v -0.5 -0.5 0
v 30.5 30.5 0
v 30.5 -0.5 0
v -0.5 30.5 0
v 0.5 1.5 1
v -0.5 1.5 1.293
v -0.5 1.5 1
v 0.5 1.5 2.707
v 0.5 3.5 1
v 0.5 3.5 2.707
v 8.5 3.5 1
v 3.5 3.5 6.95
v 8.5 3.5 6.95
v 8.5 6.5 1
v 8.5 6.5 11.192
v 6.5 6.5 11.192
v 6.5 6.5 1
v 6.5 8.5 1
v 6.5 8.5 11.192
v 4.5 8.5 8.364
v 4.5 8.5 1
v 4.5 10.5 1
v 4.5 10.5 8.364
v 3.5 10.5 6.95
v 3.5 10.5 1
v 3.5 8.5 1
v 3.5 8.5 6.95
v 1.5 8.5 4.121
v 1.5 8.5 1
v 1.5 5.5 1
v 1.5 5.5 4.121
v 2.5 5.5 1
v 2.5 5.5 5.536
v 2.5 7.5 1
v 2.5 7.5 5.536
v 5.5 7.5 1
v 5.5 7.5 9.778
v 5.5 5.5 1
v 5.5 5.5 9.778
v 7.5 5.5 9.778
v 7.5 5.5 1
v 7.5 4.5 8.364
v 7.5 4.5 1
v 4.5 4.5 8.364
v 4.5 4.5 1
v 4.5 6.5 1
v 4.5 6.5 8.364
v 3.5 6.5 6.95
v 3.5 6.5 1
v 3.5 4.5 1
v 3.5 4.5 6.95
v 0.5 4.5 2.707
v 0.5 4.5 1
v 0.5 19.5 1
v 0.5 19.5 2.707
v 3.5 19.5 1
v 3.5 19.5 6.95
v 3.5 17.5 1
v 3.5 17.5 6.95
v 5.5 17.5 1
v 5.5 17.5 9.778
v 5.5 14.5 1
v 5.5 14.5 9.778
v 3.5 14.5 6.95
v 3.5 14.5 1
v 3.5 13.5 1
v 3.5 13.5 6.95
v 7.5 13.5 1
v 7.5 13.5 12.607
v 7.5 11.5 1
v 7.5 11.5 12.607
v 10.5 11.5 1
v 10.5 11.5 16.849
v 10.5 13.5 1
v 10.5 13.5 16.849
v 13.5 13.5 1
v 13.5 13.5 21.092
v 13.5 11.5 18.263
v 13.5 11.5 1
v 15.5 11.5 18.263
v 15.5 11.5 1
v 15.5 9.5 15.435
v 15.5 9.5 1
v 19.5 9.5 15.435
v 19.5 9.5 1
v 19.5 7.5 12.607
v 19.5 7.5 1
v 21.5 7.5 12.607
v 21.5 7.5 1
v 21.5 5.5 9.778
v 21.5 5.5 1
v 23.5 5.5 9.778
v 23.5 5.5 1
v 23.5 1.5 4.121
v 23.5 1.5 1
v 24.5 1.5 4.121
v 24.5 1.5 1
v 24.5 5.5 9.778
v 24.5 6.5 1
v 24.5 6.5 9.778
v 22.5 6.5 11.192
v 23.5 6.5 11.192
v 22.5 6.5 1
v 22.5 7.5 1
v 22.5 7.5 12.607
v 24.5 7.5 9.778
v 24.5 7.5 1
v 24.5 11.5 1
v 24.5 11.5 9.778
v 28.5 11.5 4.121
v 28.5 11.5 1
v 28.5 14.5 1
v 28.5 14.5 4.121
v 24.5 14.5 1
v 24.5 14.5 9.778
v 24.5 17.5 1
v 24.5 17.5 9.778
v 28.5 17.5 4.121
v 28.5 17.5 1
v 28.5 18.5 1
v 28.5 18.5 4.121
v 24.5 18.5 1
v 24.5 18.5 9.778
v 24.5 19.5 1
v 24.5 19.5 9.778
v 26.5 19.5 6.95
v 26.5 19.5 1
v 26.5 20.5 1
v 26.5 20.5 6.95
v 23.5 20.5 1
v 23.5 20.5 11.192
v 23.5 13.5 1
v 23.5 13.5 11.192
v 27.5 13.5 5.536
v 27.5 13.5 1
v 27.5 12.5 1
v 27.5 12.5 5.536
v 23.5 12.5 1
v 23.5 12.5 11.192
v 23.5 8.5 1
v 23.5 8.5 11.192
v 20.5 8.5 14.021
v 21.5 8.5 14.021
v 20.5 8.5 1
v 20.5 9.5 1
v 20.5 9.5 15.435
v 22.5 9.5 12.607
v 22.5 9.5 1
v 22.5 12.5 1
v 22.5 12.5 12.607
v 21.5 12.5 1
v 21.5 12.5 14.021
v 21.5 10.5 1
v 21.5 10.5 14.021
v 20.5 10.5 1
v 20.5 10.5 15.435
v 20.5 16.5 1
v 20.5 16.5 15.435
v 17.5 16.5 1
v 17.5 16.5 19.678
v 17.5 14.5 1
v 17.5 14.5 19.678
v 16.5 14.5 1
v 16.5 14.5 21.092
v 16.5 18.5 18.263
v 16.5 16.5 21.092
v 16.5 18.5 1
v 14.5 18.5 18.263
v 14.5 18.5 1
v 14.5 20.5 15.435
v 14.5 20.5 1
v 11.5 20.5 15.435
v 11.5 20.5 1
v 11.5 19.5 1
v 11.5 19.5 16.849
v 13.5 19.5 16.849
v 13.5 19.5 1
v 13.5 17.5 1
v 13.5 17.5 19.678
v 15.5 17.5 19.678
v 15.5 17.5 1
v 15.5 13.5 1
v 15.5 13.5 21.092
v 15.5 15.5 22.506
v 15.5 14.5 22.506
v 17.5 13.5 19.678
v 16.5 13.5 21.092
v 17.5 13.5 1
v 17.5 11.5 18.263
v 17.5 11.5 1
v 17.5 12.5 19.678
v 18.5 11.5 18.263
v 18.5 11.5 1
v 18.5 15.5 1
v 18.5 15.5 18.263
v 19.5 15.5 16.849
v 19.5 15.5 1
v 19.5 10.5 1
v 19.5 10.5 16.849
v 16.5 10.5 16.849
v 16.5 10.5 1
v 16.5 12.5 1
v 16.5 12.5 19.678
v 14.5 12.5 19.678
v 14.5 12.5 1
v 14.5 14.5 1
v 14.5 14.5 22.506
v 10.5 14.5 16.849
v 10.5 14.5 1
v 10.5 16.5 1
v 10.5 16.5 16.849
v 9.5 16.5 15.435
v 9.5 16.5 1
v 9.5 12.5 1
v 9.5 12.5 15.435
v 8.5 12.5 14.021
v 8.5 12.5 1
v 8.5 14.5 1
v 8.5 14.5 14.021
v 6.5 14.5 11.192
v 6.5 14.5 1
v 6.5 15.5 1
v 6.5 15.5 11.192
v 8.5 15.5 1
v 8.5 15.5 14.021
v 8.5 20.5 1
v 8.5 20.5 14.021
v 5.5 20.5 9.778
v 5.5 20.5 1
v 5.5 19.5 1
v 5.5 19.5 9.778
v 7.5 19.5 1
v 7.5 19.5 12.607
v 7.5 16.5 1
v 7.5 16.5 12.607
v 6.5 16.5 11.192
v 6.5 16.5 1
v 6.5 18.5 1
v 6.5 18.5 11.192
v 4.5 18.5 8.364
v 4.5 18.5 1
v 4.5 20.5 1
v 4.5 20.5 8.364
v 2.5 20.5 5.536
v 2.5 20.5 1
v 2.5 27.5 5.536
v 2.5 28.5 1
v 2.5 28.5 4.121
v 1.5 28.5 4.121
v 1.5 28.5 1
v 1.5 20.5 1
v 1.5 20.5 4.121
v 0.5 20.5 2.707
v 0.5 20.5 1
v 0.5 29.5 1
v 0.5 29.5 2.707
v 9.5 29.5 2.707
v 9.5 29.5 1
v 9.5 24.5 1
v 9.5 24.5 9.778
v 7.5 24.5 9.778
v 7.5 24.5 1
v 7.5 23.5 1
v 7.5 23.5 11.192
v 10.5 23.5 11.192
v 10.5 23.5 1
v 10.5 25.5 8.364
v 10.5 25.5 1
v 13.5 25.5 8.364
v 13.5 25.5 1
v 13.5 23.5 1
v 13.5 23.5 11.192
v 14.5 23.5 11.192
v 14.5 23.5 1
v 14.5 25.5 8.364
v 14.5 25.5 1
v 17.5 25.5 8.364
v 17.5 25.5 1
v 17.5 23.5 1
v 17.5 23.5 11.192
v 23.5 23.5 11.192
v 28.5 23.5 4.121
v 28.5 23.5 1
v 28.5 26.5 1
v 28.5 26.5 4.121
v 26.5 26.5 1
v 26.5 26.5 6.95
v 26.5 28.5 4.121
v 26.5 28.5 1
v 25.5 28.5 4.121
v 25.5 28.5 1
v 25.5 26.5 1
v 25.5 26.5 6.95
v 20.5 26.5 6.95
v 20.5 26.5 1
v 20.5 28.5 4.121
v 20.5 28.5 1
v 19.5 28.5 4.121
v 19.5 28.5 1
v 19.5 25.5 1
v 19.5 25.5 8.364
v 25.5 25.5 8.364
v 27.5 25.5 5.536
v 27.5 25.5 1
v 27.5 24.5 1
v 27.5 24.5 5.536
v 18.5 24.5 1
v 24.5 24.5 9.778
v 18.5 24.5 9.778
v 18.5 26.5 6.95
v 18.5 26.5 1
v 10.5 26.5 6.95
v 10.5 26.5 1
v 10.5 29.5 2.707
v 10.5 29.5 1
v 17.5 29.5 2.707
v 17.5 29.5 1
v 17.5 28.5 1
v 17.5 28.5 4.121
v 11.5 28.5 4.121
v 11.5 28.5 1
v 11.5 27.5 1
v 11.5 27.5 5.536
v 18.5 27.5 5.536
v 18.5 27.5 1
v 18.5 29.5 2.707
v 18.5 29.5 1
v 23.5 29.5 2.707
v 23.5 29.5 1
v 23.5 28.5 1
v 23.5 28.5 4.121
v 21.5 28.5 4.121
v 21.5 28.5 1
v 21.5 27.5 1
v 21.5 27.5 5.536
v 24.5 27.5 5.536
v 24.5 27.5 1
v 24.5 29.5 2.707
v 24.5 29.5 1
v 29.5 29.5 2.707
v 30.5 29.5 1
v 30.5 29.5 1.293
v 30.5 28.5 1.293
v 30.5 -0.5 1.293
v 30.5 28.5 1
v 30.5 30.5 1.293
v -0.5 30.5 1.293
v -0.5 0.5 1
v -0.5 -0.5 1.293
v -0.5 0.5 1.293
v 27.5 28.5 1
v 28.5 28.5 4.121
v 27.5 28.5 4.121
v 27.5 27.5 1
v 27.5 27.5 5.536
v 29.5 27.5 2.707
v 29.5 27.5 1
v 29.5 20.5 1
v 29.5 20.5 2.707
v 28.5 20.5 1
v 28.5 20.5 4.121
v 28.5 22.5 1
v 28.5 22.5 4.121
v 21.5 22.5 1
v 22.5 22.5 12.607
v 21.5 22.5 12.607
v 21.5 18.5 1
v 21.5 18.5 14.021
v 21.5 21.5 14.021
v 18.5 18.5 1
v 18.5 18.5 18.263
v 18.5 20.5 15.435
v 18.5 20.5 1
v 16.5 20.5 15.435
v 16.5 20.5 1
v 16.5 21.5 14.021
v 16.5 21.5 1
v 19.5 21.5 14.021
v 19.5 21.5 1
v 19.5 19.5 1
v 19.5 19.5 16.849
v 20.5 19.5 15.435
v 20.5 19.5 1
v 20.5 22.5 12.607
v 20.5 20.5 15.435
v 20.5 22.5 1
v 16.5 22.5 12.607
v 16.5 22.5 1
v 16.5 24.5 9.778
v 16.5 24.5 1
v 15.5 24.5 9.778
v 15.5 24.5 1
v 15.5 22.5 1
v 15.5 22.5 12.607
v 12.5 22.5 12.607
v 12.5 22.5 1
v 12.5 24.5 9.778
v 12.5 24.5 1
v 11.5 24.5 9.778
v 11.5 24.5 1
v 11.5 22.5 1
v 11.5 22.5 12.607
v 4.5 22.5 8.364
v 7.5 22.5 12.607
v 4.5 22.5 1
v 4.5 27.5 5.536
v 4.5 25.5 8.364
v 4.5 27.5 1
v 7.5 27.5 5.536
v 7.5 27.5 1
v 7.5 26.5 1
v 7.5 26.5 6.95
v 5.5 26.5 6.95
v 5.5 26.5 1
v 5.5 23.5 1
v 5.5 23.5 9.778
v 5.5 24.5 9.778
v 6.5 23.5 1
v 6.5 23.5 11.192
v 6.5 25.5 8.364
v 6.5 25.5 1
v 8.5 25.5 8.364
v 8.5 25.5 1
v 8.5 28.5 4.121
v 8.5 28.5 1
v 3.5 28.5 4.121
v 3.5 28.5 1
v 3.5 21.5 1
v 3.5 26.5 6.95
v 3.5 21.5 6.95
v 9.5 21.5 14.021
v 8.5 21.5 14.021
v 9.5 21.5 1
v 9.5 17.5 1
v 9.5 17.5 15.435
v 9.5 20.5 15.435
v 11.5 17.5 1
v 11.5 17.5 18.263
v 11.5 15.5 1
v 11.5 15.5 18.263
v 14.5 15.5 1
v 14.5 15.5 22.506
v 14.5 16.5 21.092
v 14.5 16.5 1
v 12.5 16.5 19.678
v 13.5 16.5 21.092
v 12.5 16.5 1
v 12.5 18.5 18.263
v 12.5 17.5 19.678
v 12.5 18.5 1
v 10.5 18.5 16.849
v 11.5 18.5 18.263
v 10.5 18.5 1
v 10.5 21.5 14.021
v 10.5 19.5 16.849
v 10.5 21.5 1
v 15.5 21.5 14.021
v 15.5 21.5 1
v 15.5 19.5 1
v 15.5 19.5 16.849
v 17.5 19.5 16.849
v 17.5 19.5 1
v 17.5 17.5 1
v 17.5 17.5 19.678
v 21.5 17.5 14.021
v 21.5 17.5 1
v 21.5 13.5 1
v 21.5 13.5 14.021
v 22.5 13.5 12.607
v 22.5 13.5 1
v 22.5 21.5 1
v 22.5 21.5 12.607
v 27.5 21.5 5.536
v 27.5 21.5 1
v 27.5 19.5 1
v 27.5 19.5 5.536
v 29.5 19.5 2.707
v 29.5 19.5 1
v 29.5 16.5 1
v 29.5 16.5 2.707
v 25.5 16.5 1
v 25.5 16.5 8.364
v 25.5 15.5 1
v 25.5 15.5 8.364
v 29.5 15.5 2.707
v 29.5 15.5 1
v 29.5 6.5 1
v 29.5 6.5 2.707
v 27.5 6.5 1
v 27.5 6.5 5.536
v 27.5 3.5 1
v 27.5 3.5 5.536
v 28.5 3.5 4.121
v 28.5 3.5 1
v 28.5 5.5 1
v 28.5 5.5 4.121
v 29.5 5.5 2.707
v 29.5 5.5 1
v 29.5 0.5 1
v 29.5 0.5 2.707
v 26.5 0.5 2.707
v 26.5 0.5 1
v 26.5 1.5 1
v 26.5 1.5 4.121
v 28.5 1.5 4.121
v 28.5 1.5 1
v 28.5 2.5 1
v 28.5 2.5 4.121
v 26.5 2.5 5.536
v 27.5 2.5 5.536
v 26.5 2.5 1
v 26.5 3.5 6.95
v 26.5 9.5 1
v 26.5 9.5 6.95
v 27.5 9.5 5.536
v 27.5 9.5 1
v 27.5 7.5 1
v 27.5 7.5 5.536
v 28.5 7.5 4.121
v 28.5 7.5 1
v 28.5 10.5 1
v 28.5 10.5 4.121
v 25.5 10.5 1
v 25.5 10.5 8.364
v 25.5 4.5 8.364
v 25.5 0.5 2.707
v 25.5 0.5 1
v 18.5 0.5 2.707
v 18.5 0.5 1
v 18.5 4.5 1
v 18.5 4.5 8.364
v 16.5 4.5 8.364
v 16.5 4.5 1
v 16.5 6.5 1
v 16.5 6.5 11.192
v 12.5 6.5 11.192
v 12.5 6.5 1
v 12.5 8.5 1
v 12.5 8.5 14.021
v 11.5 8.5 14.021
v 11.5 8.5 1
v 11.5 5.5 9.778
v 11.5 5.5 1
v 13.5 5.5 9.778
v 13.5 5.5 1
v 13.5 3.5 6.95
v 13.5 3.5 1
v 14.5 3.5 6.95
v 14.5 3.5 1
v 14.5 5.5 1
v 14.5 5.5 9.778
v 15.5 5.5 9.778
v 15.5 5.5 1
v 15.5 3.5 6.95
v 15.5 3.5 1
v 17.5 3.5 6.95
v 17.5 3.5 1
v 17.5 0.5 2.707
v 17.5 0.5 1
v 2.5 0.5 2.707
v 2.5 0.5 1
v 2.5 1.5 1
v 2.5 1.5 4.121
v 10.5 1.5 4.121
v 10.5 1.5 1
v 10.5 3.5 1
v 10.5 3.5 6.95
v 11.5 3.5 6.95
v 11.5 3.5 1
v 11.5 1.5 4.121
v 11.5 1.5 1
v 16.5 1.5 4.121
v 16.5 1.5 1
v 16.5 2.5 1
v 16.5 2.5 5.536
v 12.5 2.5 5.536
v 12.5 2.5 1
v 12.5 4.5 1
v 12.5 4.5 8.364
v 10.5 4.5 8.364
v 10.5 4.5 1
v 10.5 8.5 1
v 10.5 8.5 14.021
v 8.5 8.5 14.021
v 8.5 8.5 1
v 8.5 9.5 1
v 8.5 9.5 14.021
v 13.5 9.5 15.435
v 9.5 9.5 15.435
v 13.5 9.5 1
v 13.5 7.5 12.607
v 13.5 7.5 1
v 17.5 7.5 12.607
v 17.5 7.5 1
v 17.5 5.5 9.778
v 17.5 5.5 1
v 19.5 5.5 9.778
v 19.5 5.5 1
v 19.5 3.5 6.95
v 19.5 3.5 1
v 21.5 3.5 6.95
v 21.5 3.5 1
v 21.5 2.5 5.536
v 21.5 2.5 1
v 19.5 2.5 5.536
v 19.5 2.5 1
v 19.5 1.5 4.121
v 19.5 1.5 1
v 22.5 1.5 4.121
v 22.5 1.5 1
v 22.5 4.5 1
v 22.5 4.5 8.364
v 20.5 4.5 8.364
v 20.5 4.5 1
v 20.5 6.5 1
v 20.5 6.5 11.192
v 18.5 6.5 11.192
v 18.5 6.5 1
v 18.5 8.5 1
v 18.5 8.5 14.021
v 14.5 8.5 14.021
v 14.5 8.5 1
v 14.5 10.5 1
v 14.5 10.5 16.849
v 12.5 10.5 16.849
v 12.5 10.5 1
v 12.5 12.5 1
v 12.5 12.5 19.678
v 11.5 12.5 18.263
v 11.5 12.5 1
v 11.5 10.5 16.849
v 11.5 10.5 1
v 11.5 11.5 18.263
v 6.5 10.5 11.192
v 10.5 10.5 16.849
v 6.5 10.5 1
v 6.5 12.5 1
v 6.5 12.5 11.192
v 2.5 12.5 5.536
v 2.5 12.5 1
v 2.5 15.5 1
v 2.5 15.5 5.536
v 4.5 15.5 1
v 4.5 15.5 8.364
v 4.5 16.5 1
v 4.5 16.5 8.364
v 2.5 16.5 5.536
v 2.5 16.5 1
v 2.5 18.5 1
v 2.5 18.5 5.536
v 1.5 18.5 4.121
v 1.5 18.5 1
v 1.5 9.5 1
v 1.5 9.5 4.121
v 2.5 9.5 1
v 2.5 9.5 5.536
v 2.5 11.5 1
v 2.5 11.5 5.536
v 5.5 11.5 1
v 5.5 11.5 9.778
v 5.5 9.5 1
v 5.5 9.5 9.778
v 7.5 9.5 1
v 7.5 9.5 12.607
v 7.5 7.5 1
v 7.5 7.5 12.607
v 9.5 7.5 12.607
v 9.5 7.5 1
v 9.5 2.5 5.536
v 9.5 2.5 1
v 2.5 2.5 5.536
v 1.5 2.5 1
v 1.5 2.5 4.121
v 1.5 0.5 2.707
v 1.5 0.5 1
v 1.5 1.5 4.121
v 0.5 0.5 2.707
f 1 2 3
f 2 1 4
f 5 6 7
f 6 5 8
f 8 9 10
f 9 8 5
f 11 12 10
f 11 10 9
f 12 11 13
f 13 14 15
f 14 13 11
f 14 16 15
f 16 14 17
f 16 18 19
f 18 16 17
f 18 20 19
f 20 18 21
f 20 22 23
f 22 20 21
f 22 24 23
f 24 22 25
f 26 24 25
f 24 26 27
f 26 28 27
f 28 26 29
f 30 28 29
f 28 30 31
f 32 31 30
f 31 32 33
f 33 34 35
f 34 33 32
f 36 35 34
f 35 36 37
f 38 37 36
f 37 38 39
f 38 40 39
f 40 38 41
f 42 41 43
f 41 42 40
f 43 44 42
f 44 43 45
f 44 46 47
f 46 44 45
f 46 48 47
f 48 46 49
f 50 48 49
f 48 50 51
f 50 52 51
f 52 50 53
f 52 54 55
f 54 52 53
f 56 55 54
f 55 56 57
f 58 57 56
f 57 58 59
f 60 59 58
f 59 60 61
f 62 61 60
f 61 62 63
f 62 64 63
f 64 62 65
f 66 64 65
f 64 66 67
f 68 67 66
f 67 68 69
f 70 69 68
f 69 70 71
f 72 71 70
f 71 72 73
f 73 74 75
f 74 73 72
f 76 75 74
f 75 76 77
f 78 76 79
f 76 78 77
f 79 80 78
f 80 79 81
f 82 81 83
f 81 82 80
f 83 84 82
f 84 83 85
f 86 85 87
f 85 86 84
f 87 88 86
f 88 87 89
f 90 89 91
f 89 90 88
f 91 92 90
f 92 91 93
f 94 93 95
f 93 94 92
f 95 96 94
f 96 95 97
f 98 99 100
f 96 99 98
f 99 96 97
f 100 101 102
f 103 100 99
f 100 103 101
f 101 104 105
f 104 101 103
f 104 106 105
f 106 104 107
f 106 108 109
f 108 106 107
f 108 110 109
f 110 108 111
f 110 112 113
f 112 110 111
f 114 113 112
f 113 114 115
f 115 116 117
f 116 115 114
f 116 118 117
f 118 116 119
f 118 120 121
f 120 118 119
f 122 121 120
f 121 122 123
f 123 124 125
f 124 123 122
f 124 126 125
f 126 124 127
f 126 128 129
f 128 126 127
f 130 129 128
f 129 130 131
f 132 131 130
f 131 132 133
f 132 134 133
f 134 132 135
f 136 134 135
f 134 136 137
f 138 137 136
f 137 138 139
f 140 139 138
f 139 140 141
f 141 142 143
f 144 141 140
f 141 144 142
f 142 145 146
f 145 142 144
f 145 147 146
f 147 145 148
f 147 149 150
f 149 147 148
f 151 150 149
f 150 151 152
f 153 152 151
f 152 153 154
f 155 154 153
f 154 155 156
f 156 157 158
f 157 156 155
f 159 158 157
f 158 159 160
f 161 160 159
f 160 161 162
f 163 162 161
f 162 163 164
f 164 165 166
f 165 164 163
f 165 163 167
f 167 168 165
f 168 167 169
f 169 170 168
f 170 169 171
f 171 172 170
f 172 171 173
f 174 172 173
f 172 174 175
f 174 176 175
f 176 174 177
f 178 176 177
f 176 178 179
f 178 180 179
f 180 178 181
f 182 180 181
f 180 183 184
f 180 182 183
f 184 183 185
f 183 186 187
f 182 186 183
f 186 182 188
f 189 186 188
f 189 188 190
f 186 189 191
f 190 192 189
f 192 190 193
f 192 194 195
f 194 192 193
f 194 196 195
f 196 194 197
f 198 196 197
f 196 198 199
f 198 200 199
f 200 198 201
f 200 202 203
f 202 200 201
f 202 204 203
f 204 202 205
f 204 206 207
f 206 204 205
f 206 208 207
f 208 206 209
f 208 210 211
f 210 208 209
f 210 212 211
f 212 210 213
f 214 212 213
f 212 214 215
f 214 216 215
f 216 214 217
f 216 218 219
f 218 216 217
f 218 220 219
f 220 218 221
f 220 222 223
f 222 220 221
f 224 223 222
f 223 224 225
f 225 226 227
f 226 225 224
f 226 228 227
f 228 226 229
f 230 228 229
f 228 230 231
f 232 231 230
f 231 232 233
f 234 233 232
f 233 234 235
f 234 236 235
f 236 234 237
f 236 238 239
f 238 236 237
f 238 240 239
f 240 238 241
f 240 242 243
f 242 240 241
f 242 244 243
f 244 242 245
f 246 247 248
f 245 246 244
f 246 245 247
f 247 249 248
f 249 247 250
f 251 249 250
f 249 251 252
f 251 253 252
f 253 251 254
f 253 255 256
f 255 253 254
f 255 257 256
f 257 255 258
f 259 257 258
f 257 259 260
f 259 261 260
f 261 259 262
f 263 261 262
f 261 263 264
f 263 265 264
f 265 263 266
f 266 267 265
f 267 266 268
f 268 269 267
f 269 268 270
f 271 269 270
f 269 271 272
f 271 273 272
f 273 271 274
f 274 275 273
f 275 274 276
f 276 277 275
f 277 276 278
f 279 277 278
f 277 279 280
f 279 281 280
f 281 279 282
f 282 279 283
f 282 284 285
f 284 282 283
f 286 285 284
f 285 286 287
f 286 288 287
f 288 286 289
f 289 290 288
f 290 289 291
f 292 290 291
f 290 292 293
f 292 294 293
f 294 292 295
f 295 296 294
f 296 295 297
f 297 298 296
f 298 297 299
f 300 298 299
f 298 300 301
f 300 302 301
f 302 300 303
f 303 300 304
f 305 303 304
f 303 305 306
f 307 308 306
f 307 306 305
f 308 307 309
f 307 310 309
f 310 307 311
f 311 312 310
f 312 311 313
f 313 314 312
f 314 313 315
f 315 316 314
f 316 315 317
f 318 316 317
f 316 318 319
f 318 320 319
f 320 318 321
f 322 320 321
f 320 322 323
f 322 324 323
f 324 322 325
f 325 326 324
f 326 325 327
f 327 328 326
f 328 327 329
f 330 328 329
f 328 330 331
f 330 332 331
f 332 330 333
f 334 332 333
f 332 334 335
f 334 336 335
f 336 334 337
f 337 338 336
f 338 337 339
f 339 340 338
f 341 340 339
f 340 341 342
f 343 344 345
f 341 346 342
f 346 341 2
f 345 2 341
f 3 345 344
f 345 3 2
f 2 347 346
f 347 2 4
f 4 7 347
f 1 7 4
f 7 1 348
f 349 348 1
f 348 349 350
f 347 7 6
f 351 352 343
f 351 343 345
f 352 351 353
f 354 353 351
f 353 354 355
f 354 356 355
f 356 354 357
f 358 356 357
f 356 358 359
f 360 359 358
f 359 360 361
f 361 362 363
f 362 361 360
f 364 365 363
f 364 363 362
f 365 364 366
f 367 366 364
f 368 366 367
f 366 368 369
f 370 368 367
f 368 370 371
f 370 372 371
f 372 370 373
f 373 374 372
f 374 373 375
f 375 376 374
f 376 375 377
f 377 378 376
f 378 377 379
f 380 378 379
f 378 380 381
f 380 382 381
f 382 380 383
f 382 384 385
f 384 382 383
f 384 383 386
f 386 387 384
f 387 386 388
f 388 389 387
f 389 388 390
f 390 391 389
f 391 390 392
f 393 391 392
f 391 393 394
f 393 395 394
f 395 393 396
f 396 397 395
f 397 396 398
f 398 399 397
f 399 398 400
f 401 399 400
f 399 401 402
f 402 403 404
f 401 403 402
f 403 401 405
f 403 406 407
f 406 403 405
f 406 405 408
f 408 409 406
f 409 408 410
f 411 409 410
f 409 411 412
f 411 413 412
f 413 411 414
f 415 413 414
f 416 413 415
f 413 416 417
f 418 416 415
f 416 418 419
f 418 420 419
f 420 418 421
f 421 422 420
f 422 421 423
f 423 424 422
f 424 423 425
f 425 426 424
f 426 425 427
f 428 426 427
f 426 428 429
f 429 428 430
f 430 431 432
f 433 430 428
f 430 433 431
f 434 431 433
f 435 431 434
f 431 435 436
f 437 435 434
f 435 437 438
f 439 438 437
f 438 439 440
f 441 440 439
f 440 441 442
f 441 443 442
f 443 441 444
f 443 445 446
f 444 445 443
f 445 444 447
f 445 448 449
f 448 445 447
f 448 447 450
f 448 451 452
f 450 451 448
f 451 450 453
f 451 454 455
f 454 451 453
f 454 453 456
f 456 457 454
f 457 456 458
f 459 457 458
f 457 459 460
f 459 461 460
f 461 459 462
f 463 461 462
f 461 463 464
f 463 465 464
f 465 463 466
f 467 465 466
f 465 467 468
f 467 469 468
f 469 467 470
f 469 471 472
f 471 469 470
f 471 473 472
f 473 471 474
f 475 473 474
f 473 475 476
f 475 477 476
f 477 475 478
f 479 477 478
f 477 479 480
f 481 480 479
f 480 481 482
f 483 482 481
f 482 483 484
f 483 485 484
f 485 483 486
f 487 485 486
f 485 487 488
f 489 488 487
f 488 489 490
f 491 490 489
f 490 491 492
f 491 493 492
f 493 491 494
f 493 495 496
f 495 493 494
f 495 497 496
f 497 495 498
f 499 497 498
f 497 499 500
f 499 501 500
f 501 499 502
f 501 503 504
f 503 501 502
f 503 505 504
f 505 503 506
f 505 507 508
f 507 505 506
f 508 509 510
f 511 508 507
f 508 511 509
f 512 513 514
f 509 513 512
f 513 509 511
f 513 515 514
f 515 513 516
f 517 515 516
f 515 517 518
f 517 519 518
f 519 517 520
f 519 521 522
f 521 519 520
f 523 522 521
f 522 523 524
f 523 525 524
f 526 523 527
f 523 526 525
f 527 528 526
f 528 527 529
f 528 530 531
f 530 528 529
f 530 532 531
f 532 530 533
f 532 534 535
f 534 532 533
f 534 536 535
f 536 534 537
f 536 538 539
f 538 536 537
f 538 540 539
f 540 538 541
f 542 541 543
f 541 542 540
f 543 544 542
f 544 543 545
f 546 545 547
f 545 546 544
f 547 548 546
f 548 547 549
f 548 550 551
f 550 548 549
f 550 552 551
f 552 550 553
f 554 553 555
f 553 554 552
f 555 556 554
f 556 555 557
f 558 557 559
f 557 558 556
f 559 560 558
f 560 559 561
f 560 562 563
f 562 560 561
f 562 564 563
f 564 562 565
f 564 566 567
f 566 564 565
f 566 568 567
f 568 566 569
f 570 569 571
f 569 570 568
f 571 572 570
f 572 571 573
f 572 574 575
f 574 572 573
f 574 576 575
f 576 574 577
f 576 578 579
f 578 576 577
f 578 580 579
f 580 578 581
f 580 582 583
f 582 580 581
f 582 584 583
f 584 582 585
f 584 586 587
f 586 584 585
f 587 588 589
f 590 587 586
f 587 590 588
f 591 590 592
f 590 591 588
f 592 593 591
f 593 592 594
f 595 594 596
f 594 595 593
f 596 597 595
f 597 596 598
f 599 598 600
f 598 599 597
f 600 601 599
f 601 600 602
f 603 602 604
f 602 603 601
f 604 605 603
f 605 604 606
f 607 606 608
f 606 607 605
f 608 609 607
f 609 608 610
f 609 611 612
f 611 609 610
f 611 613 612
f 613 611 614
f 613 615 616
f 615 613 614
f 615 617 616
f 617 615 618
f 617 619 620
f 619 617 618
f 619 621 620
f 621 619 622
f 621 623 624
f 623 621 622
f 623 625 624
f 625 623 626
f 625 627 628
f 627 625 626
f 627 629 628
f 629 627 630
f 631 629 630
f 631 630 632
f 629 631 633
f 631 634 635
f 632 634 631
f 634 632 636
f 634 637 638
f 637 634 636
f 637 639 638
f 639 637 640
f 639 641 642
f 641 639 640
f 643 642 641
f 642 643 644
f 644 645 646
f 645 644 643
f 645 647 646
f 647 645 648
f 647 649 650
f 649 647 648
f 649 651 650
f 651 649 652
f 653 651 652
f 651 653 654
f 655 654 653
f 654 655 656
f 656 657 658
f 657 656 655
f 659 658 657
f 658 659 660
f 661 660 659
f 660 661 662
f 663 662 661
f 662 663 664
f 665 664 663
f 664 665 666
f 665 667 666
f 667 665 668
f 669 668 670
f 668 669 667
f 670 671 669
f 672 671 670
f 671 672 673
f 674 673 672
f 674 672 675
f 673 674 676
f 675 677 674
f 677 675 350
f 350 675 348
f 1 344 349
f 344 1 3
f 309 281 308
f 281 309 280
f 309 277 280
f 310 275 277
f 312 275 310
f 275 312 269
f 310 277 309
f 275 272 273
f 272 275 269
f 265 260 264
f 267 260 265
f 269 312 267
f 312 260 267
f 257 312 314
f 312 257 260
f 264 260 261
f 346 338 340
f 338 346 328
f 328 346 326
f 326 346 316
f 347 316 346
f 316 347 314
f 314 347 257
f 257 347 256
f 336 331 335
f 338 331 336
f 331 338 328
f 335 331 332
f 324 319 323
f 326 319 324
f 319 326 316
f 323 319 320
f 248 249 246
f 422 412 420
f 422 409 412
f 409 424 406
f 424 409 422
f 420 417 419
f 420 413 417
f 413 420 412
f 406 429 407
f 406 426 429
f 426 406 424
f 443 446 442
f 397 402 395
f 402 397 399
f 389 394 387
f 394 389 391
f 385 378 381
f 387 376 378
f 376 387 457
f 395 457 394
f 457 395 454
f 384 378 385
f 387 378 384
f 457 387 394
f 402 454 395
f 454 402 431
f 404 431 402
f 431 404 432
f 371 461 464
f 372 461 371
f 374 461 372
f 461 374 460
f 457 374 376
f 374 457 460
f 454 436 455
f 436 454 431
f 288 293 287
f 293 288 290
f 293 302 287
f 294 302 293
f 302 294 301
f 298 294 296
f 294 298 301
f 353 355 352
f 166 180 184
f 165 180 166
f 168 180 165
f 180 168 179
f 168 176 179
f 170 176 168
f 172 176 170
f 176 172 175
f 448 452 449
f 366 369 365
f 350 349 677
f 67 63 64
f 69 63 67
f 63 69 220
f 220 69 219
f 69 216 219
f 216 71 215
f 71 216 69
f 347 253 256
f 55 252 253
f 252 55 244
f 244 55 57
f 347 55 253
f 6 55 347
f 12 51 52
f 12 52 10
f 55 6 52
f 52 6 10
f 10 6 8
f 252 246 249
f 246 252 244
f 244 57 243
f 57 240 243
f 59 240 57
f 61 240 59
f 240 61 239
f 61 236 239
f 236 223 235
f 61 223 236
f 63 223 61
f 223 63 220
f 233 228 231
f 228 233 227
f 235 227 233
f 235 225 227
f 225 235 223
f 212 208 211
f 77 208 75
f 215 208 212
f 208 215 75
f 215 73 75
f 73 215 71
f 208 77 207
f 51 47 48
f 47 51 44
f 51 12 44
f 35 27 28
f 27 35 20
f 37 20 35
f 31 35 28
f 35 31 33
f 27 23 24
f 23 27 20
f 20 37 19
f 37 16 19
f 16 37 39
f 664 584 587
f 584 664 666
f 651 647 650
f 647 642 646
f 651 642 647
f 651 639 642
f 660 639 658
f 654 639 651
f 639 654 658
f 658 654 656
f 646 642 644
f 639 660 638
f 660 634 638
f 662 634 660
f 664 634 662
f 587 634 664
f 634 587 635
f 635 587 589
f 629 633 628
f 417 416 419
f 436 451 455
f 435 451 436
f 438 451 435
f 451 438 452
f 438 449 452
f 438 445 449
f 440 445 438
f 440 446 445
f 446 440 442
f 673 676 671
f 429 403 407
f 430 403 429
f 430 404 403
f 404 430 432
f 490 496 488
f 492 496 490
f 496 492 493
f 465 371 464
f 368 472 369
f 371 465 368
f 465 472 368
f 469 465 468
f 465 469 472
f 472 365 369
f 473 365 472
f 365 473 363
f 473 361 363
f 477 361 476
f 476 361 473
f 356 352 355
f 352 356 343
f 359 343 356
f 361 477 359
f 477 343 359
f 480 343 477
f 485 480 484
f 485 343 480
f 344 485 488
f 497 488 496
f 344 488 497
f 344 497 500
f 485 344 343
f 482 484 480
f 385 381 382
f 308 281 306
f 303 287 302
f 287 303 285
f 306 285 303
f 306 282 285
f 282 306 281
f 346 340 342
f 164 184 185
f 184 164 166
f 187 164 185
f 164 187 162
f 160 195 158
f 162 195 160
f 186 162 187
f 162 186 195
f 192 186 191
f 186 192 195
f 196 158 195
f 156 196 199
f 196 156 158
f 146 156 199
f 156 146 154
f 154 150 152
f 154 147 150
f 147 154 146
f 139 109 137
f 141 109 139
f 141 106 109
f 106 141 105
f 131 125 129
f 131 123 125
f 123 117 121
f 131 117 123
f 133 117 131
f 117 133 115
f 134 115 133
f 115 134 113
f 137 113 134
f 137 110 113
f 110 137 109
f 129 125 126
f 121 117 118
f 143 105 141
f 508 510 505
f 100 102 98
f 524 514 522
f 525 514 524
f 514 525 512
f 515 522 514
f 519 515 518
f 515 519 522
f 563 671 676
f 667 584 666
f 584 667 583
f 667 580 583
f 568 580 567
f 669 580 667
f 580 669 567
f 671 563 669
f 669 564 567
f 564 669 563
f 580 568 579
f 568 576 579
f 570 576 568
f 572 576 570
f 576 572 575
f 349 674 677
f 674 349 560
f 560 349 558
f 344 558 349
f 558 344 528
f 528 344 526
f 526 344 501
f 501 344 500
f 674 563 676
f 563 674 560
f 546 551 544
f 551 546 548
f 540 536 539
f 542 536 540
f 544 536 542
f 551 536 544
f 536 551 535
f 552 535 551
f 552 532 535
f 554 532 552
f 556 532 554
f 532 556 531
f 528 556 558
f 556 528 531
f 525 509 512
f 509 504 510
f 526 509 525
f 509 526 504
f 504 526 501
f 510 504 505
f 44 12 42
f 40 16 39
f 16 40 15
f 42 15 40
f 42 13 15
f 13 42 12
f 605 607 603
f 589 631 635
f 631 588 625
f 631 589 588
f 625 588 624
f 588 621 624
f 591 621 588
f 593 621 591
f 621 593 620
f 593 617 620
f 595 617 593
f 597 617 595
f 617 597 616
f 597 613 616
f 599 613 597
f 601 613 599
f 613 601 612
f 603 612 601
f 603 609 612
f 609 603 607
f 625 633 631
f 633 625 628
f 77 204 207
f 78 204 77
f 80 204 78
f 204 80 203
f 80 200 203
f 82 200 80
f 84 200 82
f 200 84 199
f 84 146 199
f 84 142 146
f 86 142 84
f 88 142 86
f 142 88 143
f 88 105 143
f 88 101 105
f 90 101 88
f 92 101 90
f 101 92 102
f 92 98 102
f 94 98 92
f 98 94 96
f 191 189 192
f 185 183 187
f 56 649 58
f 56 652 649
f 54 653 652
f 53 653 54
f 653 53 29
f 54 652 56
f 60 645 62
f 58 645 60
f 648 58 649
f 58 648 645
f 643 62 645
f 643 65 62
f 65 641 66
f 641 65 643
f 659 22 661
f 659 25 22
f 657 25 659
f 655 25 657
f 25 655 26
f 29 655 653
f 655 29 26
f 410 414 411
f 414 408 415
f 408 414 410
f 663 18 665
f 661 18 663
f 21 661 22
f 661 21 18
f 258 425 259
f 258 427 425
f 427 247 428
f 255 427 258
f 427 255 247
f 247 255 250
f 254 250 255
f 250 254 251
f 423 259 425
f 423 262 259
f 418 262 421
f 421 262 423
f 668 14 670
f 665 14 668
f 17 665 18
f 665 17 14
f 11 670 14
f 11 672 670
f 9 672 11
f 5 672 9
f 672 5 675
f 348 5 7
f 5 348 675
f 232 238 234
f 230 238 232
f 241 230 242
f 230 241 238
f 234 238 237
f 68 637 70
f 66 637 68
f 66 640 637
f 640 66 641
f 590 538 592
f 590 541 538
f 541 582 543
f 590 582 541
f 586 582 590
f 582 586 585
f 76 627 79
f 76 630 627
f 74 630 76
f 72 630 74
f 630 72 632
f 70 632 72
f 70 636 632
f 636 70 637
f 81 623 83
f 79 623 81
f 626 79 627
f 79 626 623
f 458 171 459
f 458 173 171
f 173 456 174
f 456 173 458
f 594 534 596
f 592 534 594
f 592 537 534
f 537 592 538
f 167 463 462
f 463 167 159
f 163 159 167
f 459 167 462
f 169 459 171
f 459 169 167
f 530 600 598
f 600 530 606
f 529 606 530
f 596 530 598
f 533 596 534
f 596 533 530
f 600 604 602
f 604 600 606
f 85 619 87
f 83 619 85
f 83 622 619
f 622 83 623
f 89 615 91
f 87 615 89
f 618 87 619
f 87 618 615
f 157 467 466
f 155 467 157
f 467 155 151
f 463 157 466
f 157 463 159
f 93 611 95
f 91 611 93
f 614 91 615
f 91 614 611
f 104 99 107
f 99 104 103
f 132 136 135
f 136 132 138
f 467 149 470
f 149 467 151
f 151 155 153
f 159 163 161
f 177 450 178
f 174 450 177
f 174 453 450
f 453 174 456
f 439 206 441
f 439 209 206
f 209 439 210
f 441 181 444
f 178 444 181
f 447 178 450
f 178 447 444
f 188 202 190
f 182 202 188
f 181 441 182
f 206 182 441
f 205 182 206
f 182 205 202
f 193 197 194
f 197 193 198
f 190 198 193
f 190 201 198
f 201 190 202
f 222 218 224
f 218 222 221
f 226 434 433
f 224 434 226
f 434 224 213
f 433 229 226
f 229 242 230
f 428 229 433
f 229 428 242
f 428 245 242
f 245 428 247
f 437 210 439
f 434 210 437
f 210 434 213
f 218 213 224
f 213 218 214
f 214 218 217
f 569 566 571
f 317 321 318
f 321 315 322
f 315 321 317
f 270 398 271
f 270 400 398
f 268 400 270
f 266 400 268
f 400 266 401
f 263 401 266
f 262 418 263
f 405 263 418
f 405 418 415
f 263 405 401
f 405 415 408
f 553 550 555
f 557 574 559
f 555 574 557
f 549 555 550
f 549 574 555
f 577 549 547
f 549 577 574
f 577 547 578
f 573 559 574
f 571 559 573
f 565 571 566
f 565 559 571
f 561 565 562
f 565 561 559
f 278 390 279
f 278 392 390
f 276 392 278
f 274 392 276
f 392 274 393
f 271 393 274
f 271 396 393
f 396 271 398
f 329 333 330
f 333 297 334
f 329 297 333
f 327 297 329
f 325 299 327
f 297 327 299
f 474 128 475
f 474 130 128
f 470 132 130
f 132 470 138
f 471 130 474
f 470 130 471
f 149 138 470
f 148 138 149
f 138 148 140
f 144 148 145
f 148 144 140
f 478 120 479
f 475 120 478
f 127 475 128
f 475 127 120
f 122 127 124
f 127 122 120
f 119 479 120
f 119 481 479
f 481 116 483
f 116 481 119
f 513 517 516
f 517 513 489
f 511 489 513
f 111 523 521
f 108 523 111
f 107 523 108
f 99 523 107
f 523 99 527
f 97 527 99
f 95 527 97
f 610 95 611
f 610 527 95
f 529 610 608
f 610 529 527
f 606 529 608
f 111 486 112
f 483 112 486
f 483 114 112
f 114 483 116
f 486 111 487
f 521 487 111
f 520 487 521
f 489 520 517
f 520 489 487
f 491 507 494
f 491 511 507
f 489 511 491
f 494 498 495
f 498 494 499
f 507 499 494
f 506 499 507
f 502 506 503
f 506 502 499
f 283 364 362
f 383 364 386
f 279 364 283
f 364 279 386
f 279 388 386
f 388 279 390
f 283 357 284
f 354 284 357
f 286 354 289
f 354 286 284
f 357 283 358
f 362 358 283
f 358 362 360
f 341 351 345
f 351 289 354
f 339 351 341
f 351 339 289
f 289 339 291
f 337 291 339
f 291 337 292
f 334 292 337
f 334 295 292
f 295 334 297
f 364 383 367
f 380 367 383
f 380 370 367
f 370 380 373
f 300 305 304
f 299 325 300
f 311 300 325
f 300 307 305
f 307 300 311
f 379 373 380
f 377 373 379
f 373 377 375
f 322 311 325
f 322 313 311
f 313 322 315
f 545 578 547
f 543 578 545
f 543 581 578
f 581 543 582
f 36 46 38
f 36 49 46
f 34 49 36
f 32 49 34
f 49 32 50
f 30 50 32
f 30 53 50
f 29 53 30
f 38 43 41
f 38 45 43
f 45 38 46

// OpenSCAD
square_block = 15; 
wall_thickness = 1;
block_width = 2;

/*
 * constants, for clearness
 *
 */
 
// random directions, for picking up a direction to visit the next block
function PERMUTATION_OF_FOUR() = [
    [1, 2, 3, 4],
    [1, 2, 4, 3],
    [1, 3, 2, 4],
    [1, 3, 4, 2],
    [1, 4, 2, 3],
    [1, 4, 3, 2],
    [2, 1, 3, 4],
    [2, 1, 4, 3],
    [2, 3, 1, 4],
    [2, 3, 4, 1],
    [2, 4, 1, 3],
    [2, 4, 3, 1],
    [3, 1, 2, 4],
    [3, 1, 4, 2],
    [3, 2, 1, 4],
    [3, 2, 4, 1],
    [3, 4, 1, 2],
    [3, 4, 2, 1],
    [4, 1, 2, 3],
    [4, 1, 3, 2],
    [4, 2, 1, 3],
    [4, 2, 3, 1],
    [4, 3, 1, 2],
    [4, 3, 2, 1]
];

function NO_WALL() = 0;
function UP_WALL() = 1;
function RIGHT_WALL() = 2;
function UP_RIGHT_WALL() = 3;

function NOT_VISITED() = 0;
function VISITED() = 1;

/* 
 * modules for creating a maze
 *
 */

// give a [x, y] point and length. draw a line in the x direction
module x_line(point, length, thickness = 1) {
    offset = thickness / 2;
    translate([point[0] - offset, point[1] - offset, 0]) 
        square([length + thickness, thickness]);
}

// give a [x, y] point and length. draw a line in the y direction
module y_line(point, length, thickness = 1) {
    offset = thickness / 2;
    translate([point[0] - offset, point[1] - offset, 0])  
        square([thickness, length + thickness]);
}

// create the outer wall of maze
module maze_outer_wall(rows, columns, block_width = 5, wall_thickness = 1) {
    x_line([0, rows * block_width], columns * block_width, wall_thickness);
    y_line([0, block_width], (rows - 1) * block_width, wall_thickness);
}

// create the inner wall of maze
module maze_inner_wall(maze, block_width = 5, wall_thickness = 1) {
    for(i = [0:len(maze) - 1]) {
        cord = maze[i];
        x = (cord[0] - 1) * block_width;
        y = (cord[1] - 1) * block_width;
        v = cord[3];
        
        if(v == 1 || v == 3) {
            x_line([x, y], block_width, wall_thickness);
        }
        if(v == 2 || v == 3) {
            y_line([x + block_width, y], block_width, wall_thickness);
        }
    }  
}

// create a maze
module maze(rows, columns, maze_vector, block_width = 5, wall_thickness = 1) {
     maze_outer_wall(rows, columns, block_width, wall_thickness);
     maze_inner_wall(maze_vector, block_width, wall_thickness);
}

/* 
 * utilities functions
 *
 */

// comare the equality of [x1, y1] and [x2, y2]
function cord_equals(cord1, cord2) = cord1 == cord2;

// is the point visited?
function not_visited(cord, vs, index = 0) =
    index == len(vs) ? true : 
        (cord_equals([vs[index][0], vs[index][1]], cord) && vs[index][2] == 1 ? false :
            not_visited(cord, vs, index + 1));
            
// pick a direction randomly
function rand_dirs() =
    PERMUTATION_OF_FOUR()[round(rands(0, 24, 1)[0])]; 

// replace v1 in the vector with v2 
function replace(v1, v2, vs) =
    [for(i = [0:len(vs) - 1]) vs[i] == v1 ? v2 : vs[i]];
    
/* 
 * functions for generating a maze vector
 *
 */

// initialize a maze
function init_maze(rows, columns) = 
    [
	    for(c = [1 : columns]) 
	        for(r = [1 : rows]) 
		        [c, r, 0,  UP_RIGHT_WALL()]
	];
    
// find a vector in the maze vector
function find(i, j, maze_vector, index = 0) =
    index == len(maze_vector) ? [] : (
        cord_equals([i, j], [maze_vector[index][0], maze_vector[index][1]]) ? maze_vector[index] : find(i, j, maze_vector, index + 1)
    );

////
// NO_WALL = 0;
// UP_WALL = 1;
// RIGHT_WALL = 2;
// UP_RIGHT_WALL = 3;
function delete_right_wall(original_block) = 
    original_block == NO_WALL() || original_block == RIGHT_WALL() ? NO_WALL() : UP_WALL();

function delete_up_wall(original_block) = 
    (original_block == NO_WALL() || original_block == UP_WALL()) ? NO_WALL() : RIGHT_WALL();
    
function delete_right_wall_of(vs, is_visited, maze_vector) =
    replace(vs, [vs[0], vs[1] , is_visited, delete_right_wall(vs[3])] ,maze_vector);

function delete_up_wall_of(vs, is_visited, maze_vector) =
    replace(vs, [vs[0], vs[1] , is_visited, delete_up_wall(vs[3])] ,maze_vector);

function go_right(i, j, rows, columns, maze_vector) =
    go_maze(i + 1, j, rows, columns, delete_right_wall_of(find(i, j, maze_vector), VISITED(), maze_vector));
    
function go_up(i, j, rows, columns, maze_vector) =
    go_maze(i, j - 1, rows, columns, delete_up_wall_of(find(i, j, maze_vector), VISITED(), maze_vector));
    
function visit(v, maze_vector) =
    replace(v, [v[0], v[1], VISITED(), v[3]], maze_vector);
 
function go_left(i, j, rows, columns, maze_vector) =
    go_maze(i - 1, j, rows, columns, delete_right_wall_of(find(i - 1, j, maze_vector), NOT_VISITED(), maze_vector));
    
function go_down(i, j, rows, columns, maze_vector) =
    go_maze(i, j + 1, rows, columns, delete_up_wall_of(find(i, j + 1, maze_vector), NOT_VISITED(), maze_vector));
    
function go_maze(i, j, rows, columns, maze_vector) =
    look_around(i, j, rand_dirs(), rows, columns, visit(find(i, j, maze_vector), maze_vector));
    
function look_around(i, j, dirs, rows, columns, maze_vector, index = 0) =
    index == 4 ? maze_vector : 
        look_around( 
            i, j, dirs, 
            rows, columns, 
            build_wall(i, j, dirs[index], rows, columns, maze_vector), 
            index + 1
        ); 

function build_wall(i, j, n, rows, columns, maze_vector) = 
    n == 1 && i != columns && not_visited([i + 1, j], maze_vector) ? go_right(i, j, rows, columns, maze_vector) : ( 
        n == 2 && j != 1 && not_visited([i, j - 1], maze_vector) ? go_up(i, j, rows, columns, maze_vector)  : (
            n == 3 && i != 1 && not_visited([i - 1, j], maze_vector) ? go_left(i, j,rows, columns,  maze_vector)  : (
                n == 4 && j != rows && not_visited([i, j + 1], maze_vector) ? go_down(i, j, rows, columns, maze_vector) : maze_vector
            ) 
        )
    ); 

module maze_pyramid(square_block, block_width = 2, wall_thickness = 1) {

	maze_vector = go_maze(1, 1, square_block, square_block, replace([square_block, square_block, 0, UP_RIGHT_WALL()], [square_block, square_block, 0, UP_WALL()], init_maze(square_block, square_block)));

	diameter = square_block * block_width / 1.4142135623730950488016887242097 + wall_thickness * 2;
	half_wall_thickness = wall_thickness / 2;
	offset = square_block * block_width / 2;
	
	intersection() {
		linear_extrude(diameter) 
			maze(square_block, square_block, maze_vector, block_width, wall_thickness);

		translate([offset, offset, 0])     
			rotate([0, 0, 45]) 
				cylinder(diameter, diameter, 0, $fn=4);
	}

	translate([-half_wall_thickness, -half_wall_thickness, 0])     
	    linear_extrude(wall_thickness) 
		    square(square_block * block_width + wall_thickness);

}
	
maze_pyramid(square_block, block_width, wall_thickness);
